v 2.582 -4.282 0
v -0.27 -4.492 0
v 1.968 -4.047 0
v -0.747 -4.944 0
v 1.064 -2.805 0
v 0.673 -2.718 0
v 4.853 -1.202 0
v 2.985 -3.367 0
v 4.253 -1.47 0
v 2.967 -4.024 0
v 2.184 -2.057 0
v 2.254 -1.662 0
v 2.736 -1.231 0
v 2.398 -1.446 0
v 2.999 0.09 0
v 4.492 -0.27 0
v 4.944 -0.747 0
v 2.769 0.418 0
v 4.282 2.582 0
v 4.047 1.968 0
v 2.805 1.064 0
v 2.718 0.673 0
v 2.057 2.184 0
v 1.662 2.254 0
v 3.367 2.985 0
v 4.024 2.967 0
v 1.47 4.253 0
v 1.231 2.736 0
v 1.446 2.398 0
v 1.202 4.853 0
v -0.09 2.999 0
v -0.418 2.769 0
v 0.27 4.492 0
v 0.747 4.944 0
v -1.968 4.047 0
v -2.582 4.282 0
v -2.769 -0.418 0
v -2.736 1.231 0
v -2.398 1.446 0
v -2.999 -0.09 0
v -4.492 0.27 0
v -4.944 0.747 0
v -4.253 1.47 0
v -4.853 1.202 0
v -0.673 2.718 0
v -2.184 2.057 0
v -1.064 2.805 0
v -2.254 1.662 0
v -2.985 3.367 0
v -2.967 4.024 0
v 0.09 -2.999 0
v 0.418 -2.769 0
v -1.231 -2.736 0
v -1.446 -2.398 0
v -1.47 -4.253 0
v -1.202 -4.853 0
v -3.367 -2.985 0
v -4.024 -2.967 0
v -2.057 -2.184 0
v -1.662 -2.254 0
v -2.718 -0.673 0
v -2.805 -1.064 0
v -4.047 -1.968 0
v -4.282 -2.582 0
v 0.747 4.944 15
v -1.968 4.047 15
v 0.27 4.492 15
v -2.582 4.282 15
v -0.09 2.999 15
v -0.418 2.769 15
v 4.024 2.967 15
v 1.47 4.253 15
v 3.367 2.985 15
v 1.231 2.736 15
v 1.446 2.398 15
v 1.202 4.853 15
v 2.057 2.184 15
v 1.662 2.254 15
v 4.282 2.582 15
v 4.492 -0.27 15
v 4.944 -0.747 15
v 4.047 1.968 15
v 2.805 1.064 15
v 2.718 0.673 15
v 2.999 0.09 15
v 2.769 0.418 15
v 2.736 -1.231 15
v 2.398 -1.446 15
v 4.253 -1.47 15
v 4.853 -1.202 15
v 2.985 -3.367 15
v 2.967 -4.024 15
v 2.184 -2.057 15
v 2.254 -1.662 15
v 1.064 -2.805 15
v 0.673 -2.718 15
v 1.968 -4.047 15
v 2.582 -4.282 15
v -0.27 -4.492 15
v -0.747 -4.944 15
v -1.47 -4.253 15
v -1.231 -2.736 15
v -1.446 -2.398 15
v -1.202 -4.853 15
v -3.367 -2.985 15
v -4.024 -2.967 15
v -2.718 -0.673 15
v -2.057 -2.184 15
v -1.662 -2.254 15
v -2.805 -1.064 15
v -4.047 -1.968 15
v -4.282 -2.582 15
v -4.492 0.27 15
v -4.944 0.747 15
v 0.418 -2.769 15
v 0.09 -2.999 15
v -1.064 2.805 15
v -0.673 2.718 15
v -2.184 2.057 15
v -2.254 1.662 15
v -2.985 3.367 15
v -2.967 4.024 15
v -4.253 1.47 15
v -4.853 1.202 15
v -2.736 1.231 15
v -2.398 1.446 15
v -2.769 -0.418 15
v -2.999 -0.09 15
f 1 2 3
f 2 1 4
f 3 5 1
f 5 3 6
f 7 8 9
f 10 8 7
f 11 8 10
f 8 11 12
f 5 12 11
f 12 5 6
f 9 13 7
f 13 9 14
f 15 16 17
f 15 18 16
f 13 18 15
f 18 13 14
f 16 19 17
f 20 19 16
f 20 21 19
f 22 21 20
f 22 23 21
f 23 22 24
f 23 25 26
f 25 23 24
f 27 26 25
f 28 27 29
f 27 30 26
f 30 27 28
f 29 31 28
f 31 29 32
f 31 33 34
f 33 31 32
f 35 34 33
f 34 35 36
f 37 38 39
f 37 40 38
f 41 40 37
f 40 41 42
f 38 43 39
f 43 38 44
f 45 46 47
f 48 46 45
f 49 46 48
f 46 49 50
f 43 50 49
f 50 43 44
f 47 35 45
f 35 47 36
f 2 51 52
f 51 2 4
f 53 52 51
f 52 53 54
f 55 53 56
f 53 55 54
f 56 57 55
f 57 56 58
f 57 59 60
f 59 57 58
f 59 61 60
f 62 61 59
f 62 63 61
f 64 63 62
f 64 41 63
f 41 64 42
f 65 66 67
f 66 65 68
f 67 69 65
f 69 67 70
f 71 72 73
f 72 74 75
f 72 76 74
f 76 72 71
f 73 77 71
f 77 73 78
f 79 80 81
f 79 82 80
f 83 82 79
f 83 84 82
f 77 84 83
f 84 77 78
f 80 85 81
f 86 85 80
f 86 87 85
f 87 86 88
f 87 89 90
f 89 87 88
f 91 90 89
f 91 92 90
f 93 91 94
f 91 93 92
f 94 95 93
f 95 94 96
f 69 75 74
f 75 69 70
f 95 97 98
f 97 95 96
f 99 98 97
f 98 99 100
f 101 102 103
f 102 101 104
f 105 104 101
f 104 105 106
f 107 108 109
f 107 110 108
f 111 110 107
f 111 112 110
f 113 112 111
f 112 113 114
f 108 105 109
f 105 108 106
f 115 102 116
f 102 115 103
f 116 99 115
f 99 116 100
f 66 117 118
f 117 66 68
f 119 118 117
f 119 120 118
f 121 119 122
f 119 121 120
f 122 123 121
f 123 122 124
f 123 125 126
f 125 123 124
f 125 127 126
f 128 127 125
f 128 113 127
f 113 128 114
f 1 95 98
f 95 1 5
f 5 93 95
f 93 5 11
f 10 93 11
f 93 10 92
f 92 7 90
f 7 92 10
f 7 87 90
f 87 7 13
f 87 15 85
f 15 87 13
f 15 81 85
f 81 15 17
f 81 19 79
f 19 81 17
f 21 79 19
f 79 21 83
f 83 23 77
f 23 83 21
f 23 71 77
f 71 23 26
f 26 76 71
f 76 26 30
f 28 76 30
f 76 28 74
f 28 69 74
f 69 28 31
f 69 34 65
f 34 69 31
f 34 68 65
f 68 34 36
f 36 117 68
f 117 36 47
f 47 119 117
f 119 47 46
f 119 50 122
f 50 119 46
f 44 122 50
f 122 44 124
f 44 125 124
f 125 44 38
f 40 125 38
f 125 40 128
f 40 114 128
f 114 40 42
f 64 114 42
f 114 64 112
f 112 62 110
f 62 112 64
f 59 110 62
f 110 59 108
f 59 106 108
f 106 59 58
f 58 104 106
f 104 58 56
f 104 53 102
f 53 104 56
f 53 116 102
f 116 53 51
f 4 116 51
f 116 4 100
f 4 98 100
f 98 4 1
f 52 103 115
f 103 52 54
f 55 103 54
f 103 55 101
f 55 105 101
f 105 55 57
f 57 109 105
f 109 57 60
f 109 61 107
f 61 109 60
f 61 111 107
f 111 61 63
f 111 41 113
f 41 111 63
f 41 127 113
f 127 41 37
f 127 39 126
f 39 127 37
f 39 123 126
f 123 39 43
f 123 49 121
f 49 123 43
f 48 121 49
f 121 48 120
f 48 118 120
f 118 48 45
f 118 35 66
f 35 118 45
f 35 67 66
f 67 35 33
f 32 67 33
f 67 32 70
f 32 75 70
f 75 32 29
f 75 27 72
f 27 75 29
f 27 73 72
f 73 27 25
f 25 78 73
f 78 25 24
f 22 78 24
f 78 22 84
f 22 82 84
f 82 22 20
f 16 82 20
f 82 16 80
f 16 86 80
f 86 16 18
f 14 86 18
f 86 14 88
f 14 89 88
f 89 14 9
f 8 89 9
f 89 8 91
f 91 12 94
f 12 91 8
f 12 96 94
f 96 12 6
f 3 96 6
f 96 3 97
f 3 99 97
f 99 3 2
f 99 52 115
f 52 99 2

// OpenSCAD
module squish() {
polygon( points=[
[2.9986501012469624, 0.08998650060748697],[4.943855389680211, -0.747190662367996],[4.28158931891503, 2.5822457094848144],[2.8048277966239628, 1.06439702709354],[2.056735756202653, 2.183995885792256],[2.056735756202653, 2.183995885792256],[4.024177255448217, 2.9674900870488607],[1.2016173897941294, 4.8534642935272885],[1.2306703993206836, 2.73595511078597],[-0.08998650060748688, 2.9986501012469624],[-0.08998650060748688, 2.9986501012469624],[0.7471906623679959, 4.943855389680211],[-2.582245709484814, 4.28158931891503],[-1.0643970270935397, 2.804827796623963],[-2.1839958857922555, 2.0567357562026536],[-2.1839958857922555, 2.0567357562026536],[-2.9674900870488607, 4.024177255448217],[-4.8534642935272885, 1.2016173897941298],[-2.7359551107859703, 1.2306703993206831],[-2.9986501012469624, -0.08998650060748603],[-2.9986501012469624, -0.08998650060748603],[-4.943855389680211, 0.7471906623679963],[-4.28158931891503, -2.582245709484814],[-2.8048277966239628, -1.06439702709354],[-2.056735756202654, -2.183995885792255],[-2.056735756202654, -2.183995885792255],[-4.024177255448217, -2.9674900870488607],[-1.20161738979413, -4.8534642935272885],[-1.2306703993206858, -2.7359551107859694],[0.08998650060748718, -2.9986501012469624],[0.08998650060748718, -2.9986501012469624],[-0.7471906623679987, -4.943855389680211],[2.582245709484817, -4.281589318915028],[1.06439702709354, -2.8048277966239628],[2.183995885792256, -2.056735756202653],[2.183995885792256, -2.056735756202653],[2.9674900870488585, -4.024177255448219],[4.8534642935272885, -1.2016173897941302],[2.735955110785969, -1.2306703993206858],[2.9986501012469624, 0.08998650060748699],[2.7685590182209183, 0.4184267709260778],[4.491902429708419, -0.26983802915750066],[4.046714173664704, 1.9682744718817027],[2.7179400043752815, 0.672905738284712],[1.661794448747362, 2.2535392630510014],[1.661794448747362, 2.2535392630510014],[3.3670589687144346, 2.9854503682358695],[1.4696788074181053, 4.253239260025951],[1.446057597311496, 2.3976900185924164],[-0.4184267709260774, 2.7685590182209183],[-0.4184267709260774, 2.7685590182209183],[0.2698380291575012, 4.491902429708419],[-1.9682744718817027, 4.046714173664704],[-0.6729057382847121, 2.7179400043752815],[-2.253539263051001, 1.6617944487473622],[-2.253539263051001, 1.6617944487473622],[-2.985450368235869, 3.3670589687144346],[-4.253239260025951, 1.4696788074181057],[-2.3976900185924164, 1.4460575973114964],[-2.7685590182209183, -0.4184267709260772],[-2.7685590182209183, -0.4184267709260772],[-4.491902429708419, 0.2698380291575015],[-4.046714173664704, -1.9682744718817025],[-2.7179400043752815, -0.672905738284712],[-1.6617944487473617, -2.253539263051002],[-1.6617944487473617, -2.253539263051002],[-3.3670589687144346, -2.985450368235869],[-1.4696788074181097, -4.253239260025949],[-1.4460575973114984, -2.397690018592415],[0.4184267709260783, -2.7685590182209183],[0.4184267709260783, -2.7685590182209183],[-0.26983802915749977, -4.491902429708419],[1.9682744718817022, -4.046714173664704],[0.6729057382847118, -2.7179400043752815],[2.253539263051002, -1.6617944487473617],[2.253539263051002, -1.6617944487473617],[2.985450368235871, -3.3670589687144337],[4.253239260025949, -1.46967880741811],[2.3976900185924146, -1.4460575973114984],[2.7685590182209183, 0.4184267709260781],], paths=[
[
0,1,2,3,4,5,6,7,8,9,10,11,12,13,14,15,16,17,18,19,20,21,22,23,24,25,26,27,28,29,30,31,32,33,34,35,36,37,38,39,],
[
40,41,42,43,44,45,46,47,48,49,50,51,52,53,54,55,56,57,58,59,60,61,62,63,64,65,66,67,68,69,70,71,72,73,74,75,76,77,78,79,]
]);
}

linear_extrude( height=15 )
squish();

translate( [0,0,15] )
linear_extrude( height=3, scale=0 )
squish();

scale( [1,1,-1] )
translate( [0,0,0] )
linear_extrude( height=3, scale=0 )
squish();
